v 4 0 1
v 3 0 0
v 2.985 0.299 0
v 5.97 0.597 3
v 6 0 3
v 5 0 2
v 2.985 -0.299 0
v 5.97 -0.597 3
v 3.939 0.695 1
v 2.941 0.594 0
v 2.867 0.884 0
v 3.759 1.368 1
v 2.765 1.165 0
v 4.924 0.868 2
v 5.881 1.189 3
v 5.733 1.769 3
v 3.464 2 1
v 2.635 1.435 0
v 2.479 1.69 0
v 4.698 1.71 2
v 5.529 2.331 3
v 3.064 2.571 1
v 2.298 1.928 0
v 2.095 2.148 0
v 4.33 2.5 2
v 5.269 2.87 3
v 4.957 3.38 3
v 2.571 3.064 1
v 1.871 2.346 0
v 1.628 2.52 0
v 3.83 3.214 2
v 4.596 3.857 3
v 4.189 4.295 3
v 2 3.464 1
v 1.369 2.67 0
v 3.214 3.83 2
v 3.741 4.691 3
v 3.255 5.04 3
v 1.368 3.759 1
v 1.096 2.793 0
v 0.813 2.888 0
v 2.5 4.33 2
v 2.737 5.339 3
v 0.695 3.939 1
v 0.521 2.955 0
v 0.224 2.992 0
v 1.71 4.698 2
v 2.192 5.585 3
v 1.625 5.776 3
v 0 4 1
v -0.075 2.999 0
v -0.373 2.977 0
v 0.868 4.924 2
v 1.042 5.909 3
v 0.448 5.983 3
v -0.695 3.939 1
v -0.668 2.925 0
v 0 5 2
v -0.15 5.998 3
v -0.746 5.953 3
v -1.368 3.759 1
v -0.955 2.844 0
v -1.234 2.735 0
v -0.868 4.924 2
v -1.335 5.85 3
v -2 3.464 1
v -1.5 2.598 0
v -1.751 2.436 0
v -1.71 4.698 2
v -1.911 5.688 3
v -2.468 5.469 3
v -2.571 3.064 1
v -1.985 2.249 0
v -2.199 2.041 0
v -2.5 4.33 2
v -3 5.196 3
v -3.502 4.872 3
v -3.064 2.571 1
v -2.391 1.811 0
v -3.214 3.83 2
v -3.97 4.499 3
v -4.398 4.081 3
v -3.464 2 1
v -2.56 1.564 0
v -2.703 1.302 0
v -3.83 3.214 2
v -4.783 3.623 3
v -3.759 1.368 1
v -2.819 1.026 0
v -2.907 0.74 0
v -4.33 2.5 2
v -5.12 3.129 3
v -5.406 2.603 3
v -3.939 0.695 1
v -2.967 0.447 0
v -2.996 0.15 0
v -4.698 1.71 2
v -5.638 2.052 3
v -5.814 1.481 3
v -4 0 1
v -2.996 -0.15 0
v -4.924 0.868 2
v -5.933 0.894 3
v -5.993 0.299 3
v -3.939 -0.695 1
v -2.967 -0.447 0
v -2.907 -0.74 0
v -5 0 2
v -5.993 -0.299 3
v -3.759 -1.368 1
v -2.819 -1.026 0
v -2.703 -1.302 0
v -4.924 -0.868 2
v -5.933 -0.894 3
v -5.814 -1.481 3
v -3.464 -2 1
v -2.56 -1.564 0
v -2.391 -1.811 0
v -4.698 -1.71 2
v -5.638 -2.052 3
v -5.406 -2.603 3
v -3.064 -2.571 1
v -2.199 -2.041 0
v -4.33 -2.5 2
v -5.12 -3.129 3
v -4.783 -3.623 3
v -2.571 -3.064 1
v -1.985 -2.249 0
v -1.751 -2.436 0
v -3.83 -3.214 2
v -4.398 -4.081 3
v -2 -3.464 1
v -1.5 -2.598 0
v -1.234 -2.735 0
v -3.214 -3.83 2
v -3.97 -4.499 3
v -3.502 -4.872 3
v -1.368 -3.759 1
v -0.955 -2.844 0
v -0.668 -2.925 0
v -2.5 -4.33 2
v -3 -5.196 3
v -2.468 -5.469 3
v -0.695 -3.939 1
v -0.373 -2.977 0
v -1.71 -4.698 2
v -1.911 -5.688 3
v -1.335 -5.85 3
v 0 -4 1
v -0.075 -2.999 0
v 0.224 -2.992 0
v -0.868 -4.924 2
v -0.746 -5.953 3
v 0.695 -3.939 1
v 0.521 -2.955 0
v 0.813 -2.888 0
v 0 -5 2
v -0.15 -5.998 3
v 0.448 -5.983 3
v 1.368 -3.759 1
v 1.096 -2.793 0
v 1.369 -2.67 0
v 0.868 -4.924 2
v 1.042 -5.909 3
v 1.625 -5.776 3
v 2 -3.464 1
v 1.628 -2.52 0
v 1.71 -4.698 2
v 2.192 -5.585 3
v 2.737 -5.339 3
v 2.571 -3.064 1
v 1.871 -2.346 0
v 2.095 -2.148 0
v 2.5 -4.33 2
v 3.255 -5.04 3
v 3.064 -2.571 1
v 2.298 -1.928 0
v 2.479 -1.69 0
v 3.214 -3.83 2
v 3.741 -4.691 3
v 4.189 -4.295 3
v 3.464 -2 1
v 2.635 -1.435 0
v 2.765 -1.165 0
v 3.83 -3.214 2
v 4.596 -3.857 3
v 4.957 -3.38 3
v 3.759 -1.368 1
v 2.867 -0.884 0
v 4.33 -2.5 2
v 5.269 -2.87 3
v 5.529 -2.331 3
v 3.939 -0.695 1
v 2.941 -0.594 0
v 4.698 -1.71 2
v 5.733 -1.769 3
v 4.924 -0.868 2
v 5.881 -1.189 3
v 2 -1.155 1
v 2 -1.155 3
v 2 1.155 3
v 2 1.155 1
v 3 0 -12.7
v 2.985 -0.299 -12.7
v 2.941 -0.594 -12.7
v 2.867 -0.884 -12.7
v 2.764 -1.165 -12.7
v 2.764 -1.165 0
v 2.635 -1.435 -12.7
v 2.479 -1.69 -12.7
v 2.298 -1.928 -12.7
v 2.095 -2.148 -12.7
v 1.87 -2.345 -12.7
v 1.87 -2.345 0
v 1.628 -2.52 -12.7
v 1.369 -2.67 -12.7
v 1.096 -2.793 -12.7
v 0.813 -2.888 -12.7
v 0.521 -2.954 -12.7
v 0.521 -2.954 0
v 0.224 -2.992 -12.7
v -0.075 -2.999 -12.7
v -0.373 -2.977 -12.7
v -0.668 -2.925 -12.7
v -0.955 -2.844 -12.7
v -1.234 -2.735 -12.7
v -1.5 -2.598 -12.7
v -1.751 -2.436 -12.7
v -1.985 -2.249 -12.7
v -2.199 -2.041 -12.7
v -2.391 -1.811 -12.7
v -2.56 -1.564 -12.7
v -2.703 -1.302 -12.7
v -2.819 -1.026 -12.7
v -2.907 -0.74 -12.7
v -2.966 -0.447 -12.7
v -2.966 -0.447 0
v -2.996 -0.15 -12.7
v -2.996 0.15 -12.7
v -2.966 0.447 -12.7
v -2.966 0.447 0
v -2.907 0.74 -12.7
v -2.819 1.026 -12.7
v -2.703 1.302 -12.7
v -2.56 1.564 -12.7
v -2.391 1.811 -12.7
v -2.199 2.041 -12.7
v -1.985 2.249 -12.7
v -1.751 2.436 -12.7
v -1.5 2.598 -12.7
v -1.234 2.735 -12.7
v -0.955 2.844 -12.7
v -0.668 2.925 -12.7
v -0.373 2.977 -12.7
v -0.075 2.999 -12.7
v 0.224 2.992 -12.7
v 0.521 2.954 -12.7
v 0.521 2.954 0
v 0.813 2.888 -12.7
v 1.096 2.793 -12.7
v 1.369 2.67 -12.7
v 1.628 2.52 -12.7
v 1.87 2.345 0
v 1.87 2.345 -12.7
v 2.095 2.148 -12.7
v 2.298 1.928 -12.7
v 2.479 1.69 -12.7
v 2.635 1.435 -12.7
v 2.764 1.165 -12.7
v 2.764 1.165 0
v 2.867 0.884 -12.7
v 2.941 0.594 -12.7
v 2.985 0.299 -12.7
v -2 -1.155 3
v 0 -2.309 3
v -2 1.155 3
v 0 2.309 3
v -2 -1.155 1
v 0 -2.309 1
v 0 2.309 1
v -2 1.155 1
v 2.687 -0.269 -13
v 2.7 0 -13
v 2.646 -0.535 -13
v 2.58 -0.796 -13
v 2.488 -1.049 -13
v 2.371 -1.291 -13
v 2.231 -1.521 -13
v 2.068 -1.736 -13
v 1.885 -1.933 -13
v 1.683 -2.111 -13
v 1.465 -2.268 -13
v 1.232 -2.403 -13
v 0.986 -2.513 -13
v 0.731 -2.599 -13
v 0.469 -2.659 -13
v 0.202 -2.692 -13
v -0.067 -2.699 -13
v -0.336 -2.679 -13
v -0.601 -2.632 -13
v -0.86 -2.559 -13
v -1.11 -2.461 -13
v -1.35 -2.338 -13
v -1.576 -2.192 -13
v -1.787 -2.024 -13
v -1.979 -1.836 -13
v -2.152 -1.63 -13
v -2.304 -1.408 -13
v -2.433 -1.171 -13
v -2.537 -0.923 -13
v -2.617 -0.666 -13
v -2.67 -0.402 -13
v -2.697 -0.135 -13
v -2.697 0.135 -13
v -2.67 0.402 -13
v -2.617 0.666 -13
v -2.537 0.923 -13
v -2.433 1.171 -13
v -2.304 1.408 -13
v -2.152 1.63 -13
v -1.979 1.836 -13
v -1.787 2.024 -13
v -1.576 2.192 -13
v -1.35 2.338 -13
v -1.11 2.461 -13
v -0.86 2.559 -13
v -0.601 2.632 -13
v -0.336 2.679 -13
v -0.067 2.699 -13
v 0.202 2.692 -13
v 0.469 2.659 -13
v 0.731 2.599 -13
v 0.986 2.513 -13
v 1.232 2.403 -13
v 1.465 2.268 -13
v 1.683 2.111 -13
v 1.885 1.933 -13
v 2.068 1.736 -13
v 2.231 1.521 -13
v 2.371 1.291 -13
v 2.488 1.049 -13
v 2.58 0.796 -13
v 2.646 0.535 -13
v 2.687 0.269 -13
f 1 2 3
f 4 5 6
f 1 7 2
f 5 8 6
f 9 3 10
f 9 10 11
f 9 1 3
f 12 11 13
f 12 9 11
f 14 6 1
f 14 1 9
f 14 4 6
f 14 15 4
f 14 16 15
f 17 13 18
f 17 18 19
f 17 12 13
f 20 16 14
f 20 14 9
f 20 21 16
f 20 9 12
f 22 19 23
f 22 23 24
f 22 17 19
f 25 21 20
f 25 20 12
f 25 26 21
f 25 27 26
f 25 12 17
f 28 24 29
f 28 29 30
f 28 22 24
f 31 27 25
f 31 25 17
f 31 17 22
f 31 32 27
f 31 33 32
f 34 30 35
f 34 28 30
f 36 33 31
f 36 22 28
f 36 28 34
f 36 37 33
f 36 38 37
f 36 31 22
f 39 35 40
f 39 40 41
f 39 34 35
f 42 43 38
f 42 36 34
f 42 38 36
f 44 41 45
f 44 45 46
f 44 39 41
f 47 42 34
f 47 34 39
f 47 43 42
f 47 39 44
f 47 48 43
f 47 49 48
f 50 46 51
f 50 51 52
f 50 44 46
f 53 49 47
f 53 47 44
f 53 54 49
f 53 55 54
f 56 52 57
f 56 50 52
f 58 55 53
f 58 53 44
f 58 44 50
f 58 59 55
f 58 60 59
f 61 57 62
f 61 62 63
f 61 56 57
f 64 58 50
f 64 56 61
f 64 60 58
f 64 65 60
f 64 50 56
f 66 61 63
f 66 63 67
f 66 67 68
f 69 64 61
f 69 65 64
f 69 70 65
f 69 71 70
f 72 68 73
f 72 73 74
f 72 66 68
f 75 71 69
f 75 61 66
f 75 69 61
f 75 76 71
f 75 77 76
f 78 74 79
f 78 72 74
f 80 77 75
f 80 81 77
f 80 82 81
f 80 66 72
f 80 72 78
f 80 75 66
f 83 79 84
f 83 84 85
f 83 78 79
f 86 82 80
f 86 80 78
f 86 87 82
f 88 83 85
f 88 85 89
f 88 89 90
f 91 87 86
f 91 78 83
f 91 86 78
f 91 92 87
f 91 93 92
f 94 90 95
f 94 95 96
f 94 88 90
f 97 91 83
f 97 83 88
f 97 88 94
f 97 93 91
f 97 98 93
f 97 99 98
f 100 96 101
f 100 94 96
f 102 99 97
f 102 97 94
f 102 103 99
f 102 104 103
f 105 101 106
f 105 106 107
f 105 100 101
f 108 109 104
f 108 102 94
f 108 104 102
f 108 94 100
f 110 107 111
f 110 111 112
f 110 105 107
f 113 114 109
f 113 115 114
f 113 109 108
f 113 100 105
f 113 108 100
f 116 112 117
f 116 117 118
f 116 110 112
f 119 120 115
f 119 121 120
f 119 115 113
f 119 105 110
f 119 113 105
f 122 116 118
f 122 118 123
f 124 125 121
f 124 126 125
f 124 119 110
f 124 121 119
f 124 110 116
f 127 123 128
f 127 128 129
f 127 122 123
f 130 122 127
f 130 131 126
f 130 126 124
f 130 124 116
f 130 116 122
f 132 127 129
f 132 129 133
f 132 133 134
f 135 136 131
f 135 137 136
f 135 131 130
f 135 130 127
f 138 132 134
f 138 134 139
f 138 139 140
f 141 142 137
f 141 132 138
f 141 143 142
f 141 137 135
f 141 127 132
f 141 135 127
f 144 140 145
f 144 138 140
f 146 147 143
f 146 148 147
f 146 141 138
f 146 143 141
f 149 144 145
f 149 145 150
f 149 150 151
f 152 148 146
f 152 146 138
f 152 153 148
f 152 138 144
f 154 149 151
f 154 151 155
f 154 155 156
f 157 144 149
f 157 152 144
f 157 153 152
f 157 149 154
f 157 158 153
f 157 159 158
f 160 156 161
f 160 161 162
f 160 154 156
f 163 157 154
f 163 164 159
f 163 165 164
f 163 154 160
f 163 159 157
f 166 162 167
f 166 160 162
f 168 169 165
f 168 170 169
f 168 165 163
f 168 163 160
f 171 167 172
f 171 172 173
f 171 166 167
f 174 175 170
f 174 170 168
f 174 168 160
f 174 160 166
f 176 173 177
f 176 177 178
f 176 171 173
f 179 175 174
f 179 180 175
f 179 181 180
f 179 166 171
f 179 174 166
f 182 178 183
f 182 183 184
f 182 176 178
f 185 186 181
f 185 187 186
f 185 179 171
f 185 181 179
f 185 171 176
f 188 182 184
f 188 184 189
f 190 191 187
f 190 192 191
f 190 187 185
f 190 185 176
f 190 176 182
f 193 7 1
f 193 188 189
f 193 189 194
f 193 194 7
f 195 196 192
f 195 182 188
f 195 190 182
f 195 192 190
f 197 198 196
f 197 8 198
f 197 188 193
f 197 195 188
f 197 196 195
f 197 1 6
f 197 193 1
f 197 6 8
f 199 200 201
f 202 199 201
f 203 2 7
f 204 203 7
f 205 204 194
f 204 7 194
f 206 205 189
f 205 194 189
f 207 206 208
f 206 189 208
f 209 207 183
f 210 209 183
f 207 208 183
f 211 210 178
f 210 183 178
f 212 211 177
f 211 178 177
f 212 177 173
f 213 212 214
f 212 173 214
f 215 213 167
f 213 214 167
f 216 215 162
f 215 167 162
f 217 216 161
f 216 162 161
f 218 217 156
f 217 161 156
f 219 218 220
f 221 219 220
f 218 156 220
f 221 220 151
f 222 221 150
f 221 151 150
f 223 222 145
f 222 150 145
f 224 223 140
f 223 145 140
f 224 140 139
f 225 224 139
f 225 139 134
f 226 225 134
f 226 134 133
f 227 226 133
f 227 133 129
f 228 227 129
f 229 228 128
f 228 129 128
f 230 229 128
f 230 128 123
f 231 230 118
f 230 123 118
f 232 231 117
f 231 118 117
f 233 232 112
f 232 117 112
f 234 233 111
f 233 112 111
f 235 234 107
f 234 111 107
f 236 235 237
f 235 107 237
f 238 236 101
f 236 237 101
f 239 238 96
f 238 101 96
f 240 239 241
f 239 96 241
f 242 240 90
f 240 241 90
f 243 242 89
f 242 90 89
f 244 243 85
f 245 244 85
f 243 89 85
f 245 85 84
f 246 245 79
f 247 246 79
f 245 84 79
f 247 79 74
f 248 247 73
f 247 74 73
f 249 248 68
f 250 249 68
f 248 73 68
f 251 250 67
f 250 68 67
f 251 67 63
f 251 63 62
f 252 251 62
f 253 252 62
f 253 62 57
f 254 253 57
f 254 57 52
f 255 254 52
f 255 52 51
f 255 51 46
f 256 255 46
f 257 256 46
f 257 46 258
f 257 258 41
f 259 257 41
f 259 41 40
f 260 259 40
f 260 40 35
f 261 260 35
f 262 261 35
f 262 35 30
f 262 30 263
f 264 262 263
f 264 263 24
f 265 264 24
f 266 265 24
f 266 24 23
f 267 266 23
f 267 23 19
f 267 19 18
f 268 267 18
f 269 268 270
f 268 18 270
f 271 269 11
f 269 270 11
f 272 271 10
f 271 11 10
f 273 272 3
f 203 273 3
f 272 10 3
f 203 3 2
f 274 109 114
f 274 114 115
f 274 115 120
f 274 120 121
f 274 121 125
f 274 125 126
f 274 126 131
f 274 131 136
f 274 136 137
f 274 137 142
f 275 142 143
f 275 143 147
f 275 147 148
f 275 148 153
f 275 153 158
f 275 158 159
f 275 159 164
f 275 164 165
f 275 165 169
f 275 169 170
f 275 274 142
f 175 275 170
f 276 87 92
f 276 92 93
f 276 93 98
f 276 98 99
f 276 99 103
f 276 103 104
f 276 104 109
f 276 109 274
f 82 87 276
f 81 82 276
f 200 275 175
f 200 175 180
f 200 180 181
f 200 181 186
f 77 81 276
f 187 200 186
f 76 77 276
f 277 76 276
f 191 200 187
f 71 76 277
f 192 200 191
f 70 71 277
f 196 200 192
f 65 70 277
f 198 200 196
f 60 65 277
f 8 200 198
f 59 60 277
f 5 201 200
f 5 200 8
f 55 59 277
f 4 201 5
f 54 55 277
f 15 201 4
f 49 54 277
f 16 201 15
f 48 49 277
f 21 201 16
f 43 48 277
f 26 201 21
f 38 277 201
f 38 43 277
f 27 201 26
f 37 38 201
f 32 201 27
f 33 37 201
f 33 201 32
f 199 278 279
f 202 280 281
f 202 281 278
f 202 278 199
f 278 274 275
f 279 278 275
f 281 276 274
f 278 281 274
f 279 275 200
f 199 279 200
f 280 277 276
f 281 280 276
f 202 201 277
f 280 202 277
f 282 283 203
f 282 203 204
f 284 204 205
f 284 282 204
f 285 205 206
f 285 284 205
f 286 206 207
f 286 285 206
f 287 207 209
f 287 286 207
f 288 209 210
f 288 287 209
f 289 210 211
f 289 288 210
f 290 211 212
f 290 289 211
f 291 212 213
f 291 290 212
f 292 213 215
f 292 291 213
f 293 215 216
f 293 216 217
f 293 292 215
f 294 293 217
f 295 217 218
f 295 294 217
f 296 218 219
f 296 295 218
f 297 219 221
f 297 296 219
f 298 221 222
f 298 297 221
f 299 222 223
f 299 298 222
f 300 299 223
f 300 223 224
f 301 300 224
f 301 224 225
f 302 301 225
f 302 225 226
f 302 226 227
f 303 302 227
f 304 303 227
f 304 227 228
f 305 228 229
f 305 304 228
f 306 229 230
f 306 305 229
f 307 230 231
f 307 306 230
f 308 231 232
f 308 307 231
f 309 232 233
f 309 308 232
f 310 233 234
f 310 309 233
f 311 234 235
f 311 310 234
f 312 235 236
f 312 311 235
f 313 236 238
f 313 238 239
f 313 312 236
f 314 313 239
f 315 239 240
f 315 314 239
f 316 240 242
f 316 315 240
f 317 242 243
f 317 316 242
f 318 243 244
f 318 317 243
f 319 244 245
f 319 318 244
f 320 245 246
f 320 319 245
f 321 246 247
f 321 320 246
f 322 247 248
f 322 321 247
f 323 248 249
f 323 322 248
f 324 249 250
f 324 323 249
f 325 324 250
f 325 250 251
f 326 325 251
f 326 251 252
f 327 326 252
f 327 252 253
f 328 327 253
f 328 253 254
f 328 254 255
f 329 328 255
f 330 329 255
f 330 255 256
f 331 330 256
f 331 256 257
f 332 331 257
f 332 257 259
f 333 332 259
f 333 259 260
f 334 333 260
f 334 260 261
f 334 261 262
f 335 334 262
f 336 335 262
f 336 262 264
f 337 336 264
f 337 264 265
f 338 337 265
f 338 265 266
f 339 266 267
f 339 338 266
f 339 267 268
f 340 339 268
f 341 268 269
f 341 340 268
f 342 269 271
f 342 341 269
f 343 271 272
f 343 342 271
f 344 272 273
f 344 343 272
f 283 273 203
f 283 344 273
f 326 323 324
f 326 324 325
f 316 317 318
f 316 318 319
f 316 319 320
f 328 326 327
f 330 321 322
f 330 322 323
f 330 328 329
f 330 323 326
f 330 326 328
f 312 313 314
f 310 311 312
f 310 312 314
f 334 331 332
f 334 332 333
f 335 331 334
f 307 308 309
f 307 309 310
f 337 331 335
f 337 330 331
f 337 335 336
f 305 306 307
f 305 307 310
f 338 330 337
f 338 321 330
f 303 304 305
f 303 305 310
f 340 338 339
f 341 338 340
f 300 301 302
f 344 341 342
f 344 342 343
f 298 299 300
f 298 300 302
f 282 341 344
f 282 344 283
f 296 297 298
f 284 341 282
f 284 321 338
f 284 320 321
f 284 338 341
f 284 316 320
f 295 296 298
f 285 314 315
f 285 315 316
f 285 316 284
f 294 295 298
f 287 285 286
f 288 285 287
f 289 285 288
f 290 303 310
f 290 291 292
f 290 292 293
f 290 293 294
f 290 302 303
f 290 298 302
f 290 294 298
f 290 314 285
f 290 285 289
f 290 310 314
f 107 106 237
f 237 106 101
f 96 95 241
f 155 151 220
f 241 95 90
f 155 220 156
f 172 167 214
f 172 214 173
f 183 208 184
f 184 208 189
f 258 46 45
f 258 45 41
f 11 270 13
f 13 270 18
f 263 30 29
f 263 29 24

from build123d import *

# Parameters (mm, degrees)
SKETCH1_R           = 6
BOSS_EXTRUDE1_DEPTH = 3
SKETCH2_R           = 3
BOSS_EXTRUDE2_DEPTH = 13
CHAMFER1_SIZE       = 0.3
CUT_EXTRUDE1_DEPTH  = 2
CHAMFER2_SIZE       = 3


with BuildPart() as part:
    # Sketch1 → Boss-Extrude1 (new body)
    with BuildSketch(Plane.XY):
        Circle(SKETCH1_R)
    extrude(amount=BOSS_EXTRUDE1_DEPTH)

    # Sketch2 → Boss-Extrude2 (add)
    with BuildSketch(Plane(origin=(0, 0, 0), x_dir=(-1, 0, 0), z_dir=(0, 0, -1))):
        with Locations(Location((0, 0, 0), (0, 0, 180))):
            Circle(SKETCH2_R)
    extrude(amount=BOSS_EXTRUDE2_DEPTH)

    # Chamfer1
    chamfer1_edges = [part.edges().sort_by_distance(p)[0] for p in [
        (-3, 0, -13),
    ]]
    chamfer(chamfer1_edges, length=CHAMFER1_SIZE)

    # Sketch3 → Cut-Extrude1 (cut)
    with BuildSketch(Plane.XY.offset(3)):
        Polygon((0, 2.309401077), (-2, 1.154700538), (-2, -1.154700538), (0, -2.309401077), (2, -1.154700538), (2, 1.154700538), align=None)
    extrude(amount=-CUT_EXTRUDE1_DEPTH, mode=Mode.SUBTRACT)

    # Chamfer2
    chamfer2_edges = [part.edges().sort_by_distance(p)[0] for p in [
        (-6, 0, 0),
    ]]
    chamfer(chamfer2_edges, length=CHAMFER2_SIZE - 0.0001)  # a hair under: the kernel refuses the full size


solid = part.part
